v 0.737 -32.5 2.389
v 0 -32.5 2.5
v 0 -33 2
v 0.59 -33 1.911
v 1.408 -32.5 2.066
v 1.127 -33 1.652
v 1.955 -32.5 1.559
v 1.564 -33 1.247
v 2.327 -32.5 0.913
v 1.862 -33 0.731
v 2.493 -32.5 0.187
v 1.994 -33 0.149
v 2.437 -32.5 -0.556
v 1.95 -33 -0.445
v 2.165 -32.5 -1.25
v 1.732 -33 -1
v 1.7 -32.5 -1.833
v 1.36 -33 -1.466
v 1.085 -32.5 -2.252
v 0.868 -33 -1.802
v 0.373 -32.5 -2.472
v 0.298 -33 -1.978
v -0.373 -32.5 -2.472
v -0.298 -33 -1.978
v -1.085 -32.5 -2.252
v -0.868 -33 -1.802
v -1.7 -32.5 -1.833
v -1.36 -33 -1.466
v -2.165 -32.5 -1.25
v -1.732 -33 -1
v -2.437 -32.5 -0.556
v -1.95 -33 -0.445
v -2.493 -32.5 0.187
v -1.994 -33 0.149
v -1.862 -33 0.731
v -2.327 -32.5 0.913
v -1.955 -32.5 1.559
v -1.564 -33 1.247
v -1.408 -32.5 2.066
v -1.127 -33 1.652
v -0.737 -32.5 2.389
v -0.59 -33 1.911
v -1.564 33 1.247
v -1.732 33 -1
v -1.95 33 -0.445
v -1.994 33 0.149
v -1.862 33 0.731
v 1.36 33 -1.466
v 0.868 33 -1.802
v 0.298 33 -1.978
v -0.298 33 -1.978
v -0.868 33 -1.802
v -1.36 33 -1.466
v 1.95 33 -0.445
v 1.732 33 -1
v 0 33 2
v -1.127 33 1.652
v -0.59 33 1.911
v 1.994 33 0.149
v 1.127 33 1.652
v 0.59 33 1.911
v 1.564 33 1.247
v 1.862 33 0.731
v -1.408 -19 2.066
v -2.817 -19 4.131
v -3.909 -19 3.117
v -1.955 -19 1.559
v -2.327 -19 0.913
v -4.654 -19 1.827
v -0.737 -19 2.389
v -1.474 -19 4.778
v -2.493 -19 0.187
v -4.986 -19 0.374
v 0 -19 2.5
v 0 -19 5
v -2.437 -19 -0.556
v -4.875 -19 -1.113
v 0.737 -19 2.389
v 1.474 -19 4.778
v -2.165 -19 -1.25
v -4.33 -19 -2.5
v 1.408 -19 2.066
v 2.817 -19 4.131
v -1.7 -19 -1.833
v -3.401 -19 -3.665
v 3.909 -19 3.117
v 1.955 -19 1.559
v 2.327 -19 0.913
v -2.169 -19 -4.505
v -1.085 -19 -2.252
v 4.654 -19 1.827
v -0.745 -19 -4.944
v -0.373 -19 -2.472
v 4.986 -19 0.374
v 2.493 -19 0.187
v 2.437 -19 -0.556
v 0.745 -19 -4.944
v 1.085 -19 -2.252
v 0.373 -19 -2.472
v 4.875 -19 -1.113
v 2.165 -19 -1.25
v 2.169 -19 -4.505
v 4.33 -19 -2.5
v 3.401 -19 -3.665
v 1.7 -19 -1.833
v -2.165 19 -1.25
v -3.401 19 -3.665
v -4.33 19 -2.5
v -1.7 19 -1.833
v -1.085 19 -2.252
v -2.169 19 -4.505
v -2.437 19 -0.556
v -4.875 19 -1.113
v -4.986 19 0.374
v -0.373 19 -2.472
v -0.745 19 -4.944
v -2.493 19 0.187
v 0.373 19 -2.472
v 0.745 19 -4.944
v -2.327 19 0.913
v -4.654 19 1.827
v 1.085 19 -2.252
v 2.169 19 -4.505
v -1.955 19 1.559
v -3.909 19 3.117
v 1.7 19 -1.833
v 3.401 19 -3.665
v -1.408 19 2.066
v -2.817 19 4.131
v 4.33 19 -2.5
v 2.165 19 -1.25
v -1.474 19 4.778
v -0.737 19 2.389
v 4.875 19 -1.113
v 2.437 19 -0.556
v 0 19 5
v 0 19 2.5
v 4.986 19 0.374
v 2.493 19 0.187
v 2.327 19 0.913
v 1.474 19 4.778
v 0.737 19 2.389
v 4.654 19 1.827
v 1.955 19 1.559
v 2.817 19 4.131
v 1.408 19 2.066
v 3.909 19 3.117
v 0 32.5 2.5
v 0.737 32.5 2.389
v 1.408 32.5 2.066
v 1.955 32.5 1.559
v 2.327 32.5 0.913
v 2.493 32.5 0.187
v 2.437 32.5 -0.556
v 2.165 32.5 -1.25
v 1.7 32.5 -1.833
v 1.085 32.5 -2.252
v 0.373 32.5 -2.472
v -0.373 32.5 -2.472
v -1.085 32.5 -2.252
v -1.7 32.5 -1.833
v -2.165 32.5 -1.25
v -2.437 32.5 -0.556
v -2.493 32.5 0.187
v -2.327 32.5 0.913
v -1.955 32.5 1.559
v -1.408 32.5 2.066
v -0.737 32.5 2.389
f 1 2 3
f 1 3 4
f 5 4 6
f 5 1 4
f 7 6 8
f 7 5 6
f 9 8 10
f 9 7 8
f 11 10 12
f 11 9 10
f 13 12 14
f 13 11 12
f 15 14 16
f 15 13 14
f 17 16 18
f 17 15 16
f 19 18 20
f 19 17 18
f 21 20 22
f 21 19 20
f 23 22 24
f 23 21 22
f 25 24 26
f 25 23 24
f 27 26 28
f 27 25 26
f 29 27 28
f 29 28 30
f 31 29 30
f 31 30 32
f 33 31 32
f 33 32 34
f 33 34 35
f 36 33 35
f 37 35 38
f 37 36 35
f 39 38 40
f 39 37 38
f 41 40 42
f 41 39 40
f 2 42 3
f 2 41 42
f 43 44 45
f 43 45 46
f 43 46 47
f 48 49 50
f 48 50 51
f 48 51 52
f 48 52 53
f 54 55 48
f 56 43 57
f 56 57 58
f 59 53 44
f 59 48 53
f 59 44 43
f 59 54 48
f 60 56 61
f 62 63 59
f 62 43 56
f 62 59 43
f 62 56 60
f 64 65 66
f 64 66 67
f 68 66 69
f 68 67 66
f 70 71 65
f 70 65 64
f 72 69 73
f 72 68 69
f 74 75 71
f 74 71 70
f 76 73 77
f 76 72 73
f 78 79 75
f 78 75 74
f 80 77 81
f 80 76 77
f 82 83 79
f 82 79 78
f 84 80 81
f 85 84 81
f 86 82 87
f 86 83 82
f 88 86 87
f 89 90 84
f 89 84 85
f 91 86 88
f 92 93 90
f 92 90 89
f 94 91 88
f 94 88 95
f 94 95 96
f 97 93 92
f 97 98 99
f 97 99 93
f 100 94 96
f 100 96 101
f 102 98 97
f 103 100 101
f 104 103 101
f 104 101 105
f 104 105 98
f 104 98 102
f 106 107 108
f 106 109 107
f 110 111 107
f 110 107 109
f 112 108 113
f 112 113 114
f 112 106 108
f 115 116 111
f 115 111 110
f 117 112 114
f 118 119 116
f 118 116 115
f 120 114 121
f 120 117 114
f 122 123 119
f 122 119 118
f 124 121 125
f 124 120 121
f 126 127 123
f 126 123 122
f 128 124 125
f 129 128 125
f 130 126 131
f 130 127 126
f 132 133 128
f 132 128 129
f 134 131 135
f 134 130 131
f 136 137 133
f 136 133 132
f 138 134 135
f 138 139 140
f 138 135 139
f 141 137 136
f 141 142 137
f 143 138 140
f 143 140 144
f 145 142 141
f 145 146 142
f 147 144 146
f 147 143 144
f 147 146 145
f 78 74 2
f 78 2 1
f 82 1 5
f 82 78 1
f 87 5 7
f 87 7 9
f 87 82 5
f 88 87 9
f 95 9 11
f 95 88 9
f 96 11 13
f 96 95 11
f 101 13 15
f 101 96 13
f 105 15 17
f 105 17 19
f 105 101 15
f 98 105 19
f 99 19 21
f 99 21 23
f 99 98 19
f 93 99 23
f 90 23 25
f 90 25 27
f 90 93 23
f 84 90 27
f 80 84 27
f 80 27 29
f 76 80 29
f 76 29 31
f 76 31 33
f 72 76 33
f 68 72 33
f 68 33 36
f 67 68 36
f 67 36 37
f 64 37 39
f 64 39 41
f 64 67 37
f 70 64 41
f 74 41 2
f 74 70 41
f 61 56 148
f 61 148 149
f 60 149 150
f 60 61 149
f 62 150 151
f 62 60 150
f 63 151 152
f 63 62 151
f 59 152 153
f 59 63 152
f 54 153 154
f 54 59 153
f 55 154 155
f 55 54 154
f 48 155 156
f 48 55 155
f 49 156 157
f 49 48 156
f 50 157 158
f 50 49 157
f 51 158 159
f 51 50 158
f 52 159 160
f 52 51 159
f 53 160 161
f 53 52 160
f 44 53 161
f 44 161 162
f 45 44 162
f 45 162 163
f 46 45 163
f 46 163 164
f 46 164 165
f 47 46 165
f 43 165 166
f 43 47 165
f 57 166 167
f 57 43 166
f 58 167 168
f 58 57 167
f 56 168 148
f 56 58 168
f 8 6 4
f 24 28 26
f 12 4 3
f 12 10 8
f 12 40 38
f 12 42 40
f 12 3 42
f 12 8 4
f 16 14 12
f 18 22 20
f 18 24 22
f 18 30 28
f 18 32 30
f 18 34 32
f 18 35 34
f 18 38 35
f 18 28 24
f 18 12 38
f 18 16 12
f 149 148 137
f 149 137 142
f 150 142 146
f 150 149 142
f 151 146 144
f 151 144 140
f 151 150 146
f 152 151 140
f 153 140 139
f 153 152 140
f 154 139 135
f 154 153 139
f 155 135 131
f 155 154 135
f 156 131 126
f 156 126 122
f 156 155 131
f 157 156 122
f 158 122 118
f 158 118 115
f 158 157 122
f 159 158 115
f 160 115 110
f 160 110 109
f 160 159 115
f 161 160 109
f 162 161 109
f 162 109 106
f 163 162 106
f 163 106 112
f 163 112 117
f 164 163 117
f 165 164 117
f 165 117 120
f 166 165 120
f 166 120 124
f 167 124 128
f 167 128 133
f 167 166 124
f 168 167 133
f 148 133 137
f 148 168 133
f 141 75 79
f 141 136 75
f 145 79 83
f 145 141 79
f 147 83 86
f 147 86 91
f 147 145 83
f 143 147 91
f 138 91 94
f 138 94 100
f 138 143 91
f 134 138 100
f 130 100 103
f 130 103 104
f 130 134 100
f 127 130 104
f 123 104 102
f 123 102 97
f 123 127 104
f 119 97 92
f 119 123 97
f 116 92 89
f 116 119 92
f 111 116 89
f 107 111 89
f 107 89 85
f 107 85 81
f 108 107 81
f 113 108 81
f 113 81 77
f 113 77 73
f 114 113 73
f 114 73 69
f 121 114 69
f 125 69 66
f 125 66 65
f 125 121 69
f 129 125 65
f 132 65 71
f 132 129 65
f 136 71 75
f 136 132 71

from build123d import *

# Parameters (mm, degrees)
CHAMFER_SIZE = 0.5


with BuildPart() as part:
    # Sketch → Revolution (revolve)
    with BuildSketch(Plane.YZ):
        Polygon((-33, 0), (-33, 2.5), (-19, 2.5), (-19, 5), (19, 5), (19, 2.5), (33, 2.5), (33, 0), align=None)
    revolve(axis=Axis((0, 0, 0), (0, 1, 0)))

    # Chamfer
    chamfer_edges = [part.edges().sort_by_distance(p)[0] for p in [
        (0, 33, -2.5),
        (0, -33, -2.5),
    ]]
    chamfer(chamfer_edges, length=CHAMFER_SIZE)


solid = part.part
